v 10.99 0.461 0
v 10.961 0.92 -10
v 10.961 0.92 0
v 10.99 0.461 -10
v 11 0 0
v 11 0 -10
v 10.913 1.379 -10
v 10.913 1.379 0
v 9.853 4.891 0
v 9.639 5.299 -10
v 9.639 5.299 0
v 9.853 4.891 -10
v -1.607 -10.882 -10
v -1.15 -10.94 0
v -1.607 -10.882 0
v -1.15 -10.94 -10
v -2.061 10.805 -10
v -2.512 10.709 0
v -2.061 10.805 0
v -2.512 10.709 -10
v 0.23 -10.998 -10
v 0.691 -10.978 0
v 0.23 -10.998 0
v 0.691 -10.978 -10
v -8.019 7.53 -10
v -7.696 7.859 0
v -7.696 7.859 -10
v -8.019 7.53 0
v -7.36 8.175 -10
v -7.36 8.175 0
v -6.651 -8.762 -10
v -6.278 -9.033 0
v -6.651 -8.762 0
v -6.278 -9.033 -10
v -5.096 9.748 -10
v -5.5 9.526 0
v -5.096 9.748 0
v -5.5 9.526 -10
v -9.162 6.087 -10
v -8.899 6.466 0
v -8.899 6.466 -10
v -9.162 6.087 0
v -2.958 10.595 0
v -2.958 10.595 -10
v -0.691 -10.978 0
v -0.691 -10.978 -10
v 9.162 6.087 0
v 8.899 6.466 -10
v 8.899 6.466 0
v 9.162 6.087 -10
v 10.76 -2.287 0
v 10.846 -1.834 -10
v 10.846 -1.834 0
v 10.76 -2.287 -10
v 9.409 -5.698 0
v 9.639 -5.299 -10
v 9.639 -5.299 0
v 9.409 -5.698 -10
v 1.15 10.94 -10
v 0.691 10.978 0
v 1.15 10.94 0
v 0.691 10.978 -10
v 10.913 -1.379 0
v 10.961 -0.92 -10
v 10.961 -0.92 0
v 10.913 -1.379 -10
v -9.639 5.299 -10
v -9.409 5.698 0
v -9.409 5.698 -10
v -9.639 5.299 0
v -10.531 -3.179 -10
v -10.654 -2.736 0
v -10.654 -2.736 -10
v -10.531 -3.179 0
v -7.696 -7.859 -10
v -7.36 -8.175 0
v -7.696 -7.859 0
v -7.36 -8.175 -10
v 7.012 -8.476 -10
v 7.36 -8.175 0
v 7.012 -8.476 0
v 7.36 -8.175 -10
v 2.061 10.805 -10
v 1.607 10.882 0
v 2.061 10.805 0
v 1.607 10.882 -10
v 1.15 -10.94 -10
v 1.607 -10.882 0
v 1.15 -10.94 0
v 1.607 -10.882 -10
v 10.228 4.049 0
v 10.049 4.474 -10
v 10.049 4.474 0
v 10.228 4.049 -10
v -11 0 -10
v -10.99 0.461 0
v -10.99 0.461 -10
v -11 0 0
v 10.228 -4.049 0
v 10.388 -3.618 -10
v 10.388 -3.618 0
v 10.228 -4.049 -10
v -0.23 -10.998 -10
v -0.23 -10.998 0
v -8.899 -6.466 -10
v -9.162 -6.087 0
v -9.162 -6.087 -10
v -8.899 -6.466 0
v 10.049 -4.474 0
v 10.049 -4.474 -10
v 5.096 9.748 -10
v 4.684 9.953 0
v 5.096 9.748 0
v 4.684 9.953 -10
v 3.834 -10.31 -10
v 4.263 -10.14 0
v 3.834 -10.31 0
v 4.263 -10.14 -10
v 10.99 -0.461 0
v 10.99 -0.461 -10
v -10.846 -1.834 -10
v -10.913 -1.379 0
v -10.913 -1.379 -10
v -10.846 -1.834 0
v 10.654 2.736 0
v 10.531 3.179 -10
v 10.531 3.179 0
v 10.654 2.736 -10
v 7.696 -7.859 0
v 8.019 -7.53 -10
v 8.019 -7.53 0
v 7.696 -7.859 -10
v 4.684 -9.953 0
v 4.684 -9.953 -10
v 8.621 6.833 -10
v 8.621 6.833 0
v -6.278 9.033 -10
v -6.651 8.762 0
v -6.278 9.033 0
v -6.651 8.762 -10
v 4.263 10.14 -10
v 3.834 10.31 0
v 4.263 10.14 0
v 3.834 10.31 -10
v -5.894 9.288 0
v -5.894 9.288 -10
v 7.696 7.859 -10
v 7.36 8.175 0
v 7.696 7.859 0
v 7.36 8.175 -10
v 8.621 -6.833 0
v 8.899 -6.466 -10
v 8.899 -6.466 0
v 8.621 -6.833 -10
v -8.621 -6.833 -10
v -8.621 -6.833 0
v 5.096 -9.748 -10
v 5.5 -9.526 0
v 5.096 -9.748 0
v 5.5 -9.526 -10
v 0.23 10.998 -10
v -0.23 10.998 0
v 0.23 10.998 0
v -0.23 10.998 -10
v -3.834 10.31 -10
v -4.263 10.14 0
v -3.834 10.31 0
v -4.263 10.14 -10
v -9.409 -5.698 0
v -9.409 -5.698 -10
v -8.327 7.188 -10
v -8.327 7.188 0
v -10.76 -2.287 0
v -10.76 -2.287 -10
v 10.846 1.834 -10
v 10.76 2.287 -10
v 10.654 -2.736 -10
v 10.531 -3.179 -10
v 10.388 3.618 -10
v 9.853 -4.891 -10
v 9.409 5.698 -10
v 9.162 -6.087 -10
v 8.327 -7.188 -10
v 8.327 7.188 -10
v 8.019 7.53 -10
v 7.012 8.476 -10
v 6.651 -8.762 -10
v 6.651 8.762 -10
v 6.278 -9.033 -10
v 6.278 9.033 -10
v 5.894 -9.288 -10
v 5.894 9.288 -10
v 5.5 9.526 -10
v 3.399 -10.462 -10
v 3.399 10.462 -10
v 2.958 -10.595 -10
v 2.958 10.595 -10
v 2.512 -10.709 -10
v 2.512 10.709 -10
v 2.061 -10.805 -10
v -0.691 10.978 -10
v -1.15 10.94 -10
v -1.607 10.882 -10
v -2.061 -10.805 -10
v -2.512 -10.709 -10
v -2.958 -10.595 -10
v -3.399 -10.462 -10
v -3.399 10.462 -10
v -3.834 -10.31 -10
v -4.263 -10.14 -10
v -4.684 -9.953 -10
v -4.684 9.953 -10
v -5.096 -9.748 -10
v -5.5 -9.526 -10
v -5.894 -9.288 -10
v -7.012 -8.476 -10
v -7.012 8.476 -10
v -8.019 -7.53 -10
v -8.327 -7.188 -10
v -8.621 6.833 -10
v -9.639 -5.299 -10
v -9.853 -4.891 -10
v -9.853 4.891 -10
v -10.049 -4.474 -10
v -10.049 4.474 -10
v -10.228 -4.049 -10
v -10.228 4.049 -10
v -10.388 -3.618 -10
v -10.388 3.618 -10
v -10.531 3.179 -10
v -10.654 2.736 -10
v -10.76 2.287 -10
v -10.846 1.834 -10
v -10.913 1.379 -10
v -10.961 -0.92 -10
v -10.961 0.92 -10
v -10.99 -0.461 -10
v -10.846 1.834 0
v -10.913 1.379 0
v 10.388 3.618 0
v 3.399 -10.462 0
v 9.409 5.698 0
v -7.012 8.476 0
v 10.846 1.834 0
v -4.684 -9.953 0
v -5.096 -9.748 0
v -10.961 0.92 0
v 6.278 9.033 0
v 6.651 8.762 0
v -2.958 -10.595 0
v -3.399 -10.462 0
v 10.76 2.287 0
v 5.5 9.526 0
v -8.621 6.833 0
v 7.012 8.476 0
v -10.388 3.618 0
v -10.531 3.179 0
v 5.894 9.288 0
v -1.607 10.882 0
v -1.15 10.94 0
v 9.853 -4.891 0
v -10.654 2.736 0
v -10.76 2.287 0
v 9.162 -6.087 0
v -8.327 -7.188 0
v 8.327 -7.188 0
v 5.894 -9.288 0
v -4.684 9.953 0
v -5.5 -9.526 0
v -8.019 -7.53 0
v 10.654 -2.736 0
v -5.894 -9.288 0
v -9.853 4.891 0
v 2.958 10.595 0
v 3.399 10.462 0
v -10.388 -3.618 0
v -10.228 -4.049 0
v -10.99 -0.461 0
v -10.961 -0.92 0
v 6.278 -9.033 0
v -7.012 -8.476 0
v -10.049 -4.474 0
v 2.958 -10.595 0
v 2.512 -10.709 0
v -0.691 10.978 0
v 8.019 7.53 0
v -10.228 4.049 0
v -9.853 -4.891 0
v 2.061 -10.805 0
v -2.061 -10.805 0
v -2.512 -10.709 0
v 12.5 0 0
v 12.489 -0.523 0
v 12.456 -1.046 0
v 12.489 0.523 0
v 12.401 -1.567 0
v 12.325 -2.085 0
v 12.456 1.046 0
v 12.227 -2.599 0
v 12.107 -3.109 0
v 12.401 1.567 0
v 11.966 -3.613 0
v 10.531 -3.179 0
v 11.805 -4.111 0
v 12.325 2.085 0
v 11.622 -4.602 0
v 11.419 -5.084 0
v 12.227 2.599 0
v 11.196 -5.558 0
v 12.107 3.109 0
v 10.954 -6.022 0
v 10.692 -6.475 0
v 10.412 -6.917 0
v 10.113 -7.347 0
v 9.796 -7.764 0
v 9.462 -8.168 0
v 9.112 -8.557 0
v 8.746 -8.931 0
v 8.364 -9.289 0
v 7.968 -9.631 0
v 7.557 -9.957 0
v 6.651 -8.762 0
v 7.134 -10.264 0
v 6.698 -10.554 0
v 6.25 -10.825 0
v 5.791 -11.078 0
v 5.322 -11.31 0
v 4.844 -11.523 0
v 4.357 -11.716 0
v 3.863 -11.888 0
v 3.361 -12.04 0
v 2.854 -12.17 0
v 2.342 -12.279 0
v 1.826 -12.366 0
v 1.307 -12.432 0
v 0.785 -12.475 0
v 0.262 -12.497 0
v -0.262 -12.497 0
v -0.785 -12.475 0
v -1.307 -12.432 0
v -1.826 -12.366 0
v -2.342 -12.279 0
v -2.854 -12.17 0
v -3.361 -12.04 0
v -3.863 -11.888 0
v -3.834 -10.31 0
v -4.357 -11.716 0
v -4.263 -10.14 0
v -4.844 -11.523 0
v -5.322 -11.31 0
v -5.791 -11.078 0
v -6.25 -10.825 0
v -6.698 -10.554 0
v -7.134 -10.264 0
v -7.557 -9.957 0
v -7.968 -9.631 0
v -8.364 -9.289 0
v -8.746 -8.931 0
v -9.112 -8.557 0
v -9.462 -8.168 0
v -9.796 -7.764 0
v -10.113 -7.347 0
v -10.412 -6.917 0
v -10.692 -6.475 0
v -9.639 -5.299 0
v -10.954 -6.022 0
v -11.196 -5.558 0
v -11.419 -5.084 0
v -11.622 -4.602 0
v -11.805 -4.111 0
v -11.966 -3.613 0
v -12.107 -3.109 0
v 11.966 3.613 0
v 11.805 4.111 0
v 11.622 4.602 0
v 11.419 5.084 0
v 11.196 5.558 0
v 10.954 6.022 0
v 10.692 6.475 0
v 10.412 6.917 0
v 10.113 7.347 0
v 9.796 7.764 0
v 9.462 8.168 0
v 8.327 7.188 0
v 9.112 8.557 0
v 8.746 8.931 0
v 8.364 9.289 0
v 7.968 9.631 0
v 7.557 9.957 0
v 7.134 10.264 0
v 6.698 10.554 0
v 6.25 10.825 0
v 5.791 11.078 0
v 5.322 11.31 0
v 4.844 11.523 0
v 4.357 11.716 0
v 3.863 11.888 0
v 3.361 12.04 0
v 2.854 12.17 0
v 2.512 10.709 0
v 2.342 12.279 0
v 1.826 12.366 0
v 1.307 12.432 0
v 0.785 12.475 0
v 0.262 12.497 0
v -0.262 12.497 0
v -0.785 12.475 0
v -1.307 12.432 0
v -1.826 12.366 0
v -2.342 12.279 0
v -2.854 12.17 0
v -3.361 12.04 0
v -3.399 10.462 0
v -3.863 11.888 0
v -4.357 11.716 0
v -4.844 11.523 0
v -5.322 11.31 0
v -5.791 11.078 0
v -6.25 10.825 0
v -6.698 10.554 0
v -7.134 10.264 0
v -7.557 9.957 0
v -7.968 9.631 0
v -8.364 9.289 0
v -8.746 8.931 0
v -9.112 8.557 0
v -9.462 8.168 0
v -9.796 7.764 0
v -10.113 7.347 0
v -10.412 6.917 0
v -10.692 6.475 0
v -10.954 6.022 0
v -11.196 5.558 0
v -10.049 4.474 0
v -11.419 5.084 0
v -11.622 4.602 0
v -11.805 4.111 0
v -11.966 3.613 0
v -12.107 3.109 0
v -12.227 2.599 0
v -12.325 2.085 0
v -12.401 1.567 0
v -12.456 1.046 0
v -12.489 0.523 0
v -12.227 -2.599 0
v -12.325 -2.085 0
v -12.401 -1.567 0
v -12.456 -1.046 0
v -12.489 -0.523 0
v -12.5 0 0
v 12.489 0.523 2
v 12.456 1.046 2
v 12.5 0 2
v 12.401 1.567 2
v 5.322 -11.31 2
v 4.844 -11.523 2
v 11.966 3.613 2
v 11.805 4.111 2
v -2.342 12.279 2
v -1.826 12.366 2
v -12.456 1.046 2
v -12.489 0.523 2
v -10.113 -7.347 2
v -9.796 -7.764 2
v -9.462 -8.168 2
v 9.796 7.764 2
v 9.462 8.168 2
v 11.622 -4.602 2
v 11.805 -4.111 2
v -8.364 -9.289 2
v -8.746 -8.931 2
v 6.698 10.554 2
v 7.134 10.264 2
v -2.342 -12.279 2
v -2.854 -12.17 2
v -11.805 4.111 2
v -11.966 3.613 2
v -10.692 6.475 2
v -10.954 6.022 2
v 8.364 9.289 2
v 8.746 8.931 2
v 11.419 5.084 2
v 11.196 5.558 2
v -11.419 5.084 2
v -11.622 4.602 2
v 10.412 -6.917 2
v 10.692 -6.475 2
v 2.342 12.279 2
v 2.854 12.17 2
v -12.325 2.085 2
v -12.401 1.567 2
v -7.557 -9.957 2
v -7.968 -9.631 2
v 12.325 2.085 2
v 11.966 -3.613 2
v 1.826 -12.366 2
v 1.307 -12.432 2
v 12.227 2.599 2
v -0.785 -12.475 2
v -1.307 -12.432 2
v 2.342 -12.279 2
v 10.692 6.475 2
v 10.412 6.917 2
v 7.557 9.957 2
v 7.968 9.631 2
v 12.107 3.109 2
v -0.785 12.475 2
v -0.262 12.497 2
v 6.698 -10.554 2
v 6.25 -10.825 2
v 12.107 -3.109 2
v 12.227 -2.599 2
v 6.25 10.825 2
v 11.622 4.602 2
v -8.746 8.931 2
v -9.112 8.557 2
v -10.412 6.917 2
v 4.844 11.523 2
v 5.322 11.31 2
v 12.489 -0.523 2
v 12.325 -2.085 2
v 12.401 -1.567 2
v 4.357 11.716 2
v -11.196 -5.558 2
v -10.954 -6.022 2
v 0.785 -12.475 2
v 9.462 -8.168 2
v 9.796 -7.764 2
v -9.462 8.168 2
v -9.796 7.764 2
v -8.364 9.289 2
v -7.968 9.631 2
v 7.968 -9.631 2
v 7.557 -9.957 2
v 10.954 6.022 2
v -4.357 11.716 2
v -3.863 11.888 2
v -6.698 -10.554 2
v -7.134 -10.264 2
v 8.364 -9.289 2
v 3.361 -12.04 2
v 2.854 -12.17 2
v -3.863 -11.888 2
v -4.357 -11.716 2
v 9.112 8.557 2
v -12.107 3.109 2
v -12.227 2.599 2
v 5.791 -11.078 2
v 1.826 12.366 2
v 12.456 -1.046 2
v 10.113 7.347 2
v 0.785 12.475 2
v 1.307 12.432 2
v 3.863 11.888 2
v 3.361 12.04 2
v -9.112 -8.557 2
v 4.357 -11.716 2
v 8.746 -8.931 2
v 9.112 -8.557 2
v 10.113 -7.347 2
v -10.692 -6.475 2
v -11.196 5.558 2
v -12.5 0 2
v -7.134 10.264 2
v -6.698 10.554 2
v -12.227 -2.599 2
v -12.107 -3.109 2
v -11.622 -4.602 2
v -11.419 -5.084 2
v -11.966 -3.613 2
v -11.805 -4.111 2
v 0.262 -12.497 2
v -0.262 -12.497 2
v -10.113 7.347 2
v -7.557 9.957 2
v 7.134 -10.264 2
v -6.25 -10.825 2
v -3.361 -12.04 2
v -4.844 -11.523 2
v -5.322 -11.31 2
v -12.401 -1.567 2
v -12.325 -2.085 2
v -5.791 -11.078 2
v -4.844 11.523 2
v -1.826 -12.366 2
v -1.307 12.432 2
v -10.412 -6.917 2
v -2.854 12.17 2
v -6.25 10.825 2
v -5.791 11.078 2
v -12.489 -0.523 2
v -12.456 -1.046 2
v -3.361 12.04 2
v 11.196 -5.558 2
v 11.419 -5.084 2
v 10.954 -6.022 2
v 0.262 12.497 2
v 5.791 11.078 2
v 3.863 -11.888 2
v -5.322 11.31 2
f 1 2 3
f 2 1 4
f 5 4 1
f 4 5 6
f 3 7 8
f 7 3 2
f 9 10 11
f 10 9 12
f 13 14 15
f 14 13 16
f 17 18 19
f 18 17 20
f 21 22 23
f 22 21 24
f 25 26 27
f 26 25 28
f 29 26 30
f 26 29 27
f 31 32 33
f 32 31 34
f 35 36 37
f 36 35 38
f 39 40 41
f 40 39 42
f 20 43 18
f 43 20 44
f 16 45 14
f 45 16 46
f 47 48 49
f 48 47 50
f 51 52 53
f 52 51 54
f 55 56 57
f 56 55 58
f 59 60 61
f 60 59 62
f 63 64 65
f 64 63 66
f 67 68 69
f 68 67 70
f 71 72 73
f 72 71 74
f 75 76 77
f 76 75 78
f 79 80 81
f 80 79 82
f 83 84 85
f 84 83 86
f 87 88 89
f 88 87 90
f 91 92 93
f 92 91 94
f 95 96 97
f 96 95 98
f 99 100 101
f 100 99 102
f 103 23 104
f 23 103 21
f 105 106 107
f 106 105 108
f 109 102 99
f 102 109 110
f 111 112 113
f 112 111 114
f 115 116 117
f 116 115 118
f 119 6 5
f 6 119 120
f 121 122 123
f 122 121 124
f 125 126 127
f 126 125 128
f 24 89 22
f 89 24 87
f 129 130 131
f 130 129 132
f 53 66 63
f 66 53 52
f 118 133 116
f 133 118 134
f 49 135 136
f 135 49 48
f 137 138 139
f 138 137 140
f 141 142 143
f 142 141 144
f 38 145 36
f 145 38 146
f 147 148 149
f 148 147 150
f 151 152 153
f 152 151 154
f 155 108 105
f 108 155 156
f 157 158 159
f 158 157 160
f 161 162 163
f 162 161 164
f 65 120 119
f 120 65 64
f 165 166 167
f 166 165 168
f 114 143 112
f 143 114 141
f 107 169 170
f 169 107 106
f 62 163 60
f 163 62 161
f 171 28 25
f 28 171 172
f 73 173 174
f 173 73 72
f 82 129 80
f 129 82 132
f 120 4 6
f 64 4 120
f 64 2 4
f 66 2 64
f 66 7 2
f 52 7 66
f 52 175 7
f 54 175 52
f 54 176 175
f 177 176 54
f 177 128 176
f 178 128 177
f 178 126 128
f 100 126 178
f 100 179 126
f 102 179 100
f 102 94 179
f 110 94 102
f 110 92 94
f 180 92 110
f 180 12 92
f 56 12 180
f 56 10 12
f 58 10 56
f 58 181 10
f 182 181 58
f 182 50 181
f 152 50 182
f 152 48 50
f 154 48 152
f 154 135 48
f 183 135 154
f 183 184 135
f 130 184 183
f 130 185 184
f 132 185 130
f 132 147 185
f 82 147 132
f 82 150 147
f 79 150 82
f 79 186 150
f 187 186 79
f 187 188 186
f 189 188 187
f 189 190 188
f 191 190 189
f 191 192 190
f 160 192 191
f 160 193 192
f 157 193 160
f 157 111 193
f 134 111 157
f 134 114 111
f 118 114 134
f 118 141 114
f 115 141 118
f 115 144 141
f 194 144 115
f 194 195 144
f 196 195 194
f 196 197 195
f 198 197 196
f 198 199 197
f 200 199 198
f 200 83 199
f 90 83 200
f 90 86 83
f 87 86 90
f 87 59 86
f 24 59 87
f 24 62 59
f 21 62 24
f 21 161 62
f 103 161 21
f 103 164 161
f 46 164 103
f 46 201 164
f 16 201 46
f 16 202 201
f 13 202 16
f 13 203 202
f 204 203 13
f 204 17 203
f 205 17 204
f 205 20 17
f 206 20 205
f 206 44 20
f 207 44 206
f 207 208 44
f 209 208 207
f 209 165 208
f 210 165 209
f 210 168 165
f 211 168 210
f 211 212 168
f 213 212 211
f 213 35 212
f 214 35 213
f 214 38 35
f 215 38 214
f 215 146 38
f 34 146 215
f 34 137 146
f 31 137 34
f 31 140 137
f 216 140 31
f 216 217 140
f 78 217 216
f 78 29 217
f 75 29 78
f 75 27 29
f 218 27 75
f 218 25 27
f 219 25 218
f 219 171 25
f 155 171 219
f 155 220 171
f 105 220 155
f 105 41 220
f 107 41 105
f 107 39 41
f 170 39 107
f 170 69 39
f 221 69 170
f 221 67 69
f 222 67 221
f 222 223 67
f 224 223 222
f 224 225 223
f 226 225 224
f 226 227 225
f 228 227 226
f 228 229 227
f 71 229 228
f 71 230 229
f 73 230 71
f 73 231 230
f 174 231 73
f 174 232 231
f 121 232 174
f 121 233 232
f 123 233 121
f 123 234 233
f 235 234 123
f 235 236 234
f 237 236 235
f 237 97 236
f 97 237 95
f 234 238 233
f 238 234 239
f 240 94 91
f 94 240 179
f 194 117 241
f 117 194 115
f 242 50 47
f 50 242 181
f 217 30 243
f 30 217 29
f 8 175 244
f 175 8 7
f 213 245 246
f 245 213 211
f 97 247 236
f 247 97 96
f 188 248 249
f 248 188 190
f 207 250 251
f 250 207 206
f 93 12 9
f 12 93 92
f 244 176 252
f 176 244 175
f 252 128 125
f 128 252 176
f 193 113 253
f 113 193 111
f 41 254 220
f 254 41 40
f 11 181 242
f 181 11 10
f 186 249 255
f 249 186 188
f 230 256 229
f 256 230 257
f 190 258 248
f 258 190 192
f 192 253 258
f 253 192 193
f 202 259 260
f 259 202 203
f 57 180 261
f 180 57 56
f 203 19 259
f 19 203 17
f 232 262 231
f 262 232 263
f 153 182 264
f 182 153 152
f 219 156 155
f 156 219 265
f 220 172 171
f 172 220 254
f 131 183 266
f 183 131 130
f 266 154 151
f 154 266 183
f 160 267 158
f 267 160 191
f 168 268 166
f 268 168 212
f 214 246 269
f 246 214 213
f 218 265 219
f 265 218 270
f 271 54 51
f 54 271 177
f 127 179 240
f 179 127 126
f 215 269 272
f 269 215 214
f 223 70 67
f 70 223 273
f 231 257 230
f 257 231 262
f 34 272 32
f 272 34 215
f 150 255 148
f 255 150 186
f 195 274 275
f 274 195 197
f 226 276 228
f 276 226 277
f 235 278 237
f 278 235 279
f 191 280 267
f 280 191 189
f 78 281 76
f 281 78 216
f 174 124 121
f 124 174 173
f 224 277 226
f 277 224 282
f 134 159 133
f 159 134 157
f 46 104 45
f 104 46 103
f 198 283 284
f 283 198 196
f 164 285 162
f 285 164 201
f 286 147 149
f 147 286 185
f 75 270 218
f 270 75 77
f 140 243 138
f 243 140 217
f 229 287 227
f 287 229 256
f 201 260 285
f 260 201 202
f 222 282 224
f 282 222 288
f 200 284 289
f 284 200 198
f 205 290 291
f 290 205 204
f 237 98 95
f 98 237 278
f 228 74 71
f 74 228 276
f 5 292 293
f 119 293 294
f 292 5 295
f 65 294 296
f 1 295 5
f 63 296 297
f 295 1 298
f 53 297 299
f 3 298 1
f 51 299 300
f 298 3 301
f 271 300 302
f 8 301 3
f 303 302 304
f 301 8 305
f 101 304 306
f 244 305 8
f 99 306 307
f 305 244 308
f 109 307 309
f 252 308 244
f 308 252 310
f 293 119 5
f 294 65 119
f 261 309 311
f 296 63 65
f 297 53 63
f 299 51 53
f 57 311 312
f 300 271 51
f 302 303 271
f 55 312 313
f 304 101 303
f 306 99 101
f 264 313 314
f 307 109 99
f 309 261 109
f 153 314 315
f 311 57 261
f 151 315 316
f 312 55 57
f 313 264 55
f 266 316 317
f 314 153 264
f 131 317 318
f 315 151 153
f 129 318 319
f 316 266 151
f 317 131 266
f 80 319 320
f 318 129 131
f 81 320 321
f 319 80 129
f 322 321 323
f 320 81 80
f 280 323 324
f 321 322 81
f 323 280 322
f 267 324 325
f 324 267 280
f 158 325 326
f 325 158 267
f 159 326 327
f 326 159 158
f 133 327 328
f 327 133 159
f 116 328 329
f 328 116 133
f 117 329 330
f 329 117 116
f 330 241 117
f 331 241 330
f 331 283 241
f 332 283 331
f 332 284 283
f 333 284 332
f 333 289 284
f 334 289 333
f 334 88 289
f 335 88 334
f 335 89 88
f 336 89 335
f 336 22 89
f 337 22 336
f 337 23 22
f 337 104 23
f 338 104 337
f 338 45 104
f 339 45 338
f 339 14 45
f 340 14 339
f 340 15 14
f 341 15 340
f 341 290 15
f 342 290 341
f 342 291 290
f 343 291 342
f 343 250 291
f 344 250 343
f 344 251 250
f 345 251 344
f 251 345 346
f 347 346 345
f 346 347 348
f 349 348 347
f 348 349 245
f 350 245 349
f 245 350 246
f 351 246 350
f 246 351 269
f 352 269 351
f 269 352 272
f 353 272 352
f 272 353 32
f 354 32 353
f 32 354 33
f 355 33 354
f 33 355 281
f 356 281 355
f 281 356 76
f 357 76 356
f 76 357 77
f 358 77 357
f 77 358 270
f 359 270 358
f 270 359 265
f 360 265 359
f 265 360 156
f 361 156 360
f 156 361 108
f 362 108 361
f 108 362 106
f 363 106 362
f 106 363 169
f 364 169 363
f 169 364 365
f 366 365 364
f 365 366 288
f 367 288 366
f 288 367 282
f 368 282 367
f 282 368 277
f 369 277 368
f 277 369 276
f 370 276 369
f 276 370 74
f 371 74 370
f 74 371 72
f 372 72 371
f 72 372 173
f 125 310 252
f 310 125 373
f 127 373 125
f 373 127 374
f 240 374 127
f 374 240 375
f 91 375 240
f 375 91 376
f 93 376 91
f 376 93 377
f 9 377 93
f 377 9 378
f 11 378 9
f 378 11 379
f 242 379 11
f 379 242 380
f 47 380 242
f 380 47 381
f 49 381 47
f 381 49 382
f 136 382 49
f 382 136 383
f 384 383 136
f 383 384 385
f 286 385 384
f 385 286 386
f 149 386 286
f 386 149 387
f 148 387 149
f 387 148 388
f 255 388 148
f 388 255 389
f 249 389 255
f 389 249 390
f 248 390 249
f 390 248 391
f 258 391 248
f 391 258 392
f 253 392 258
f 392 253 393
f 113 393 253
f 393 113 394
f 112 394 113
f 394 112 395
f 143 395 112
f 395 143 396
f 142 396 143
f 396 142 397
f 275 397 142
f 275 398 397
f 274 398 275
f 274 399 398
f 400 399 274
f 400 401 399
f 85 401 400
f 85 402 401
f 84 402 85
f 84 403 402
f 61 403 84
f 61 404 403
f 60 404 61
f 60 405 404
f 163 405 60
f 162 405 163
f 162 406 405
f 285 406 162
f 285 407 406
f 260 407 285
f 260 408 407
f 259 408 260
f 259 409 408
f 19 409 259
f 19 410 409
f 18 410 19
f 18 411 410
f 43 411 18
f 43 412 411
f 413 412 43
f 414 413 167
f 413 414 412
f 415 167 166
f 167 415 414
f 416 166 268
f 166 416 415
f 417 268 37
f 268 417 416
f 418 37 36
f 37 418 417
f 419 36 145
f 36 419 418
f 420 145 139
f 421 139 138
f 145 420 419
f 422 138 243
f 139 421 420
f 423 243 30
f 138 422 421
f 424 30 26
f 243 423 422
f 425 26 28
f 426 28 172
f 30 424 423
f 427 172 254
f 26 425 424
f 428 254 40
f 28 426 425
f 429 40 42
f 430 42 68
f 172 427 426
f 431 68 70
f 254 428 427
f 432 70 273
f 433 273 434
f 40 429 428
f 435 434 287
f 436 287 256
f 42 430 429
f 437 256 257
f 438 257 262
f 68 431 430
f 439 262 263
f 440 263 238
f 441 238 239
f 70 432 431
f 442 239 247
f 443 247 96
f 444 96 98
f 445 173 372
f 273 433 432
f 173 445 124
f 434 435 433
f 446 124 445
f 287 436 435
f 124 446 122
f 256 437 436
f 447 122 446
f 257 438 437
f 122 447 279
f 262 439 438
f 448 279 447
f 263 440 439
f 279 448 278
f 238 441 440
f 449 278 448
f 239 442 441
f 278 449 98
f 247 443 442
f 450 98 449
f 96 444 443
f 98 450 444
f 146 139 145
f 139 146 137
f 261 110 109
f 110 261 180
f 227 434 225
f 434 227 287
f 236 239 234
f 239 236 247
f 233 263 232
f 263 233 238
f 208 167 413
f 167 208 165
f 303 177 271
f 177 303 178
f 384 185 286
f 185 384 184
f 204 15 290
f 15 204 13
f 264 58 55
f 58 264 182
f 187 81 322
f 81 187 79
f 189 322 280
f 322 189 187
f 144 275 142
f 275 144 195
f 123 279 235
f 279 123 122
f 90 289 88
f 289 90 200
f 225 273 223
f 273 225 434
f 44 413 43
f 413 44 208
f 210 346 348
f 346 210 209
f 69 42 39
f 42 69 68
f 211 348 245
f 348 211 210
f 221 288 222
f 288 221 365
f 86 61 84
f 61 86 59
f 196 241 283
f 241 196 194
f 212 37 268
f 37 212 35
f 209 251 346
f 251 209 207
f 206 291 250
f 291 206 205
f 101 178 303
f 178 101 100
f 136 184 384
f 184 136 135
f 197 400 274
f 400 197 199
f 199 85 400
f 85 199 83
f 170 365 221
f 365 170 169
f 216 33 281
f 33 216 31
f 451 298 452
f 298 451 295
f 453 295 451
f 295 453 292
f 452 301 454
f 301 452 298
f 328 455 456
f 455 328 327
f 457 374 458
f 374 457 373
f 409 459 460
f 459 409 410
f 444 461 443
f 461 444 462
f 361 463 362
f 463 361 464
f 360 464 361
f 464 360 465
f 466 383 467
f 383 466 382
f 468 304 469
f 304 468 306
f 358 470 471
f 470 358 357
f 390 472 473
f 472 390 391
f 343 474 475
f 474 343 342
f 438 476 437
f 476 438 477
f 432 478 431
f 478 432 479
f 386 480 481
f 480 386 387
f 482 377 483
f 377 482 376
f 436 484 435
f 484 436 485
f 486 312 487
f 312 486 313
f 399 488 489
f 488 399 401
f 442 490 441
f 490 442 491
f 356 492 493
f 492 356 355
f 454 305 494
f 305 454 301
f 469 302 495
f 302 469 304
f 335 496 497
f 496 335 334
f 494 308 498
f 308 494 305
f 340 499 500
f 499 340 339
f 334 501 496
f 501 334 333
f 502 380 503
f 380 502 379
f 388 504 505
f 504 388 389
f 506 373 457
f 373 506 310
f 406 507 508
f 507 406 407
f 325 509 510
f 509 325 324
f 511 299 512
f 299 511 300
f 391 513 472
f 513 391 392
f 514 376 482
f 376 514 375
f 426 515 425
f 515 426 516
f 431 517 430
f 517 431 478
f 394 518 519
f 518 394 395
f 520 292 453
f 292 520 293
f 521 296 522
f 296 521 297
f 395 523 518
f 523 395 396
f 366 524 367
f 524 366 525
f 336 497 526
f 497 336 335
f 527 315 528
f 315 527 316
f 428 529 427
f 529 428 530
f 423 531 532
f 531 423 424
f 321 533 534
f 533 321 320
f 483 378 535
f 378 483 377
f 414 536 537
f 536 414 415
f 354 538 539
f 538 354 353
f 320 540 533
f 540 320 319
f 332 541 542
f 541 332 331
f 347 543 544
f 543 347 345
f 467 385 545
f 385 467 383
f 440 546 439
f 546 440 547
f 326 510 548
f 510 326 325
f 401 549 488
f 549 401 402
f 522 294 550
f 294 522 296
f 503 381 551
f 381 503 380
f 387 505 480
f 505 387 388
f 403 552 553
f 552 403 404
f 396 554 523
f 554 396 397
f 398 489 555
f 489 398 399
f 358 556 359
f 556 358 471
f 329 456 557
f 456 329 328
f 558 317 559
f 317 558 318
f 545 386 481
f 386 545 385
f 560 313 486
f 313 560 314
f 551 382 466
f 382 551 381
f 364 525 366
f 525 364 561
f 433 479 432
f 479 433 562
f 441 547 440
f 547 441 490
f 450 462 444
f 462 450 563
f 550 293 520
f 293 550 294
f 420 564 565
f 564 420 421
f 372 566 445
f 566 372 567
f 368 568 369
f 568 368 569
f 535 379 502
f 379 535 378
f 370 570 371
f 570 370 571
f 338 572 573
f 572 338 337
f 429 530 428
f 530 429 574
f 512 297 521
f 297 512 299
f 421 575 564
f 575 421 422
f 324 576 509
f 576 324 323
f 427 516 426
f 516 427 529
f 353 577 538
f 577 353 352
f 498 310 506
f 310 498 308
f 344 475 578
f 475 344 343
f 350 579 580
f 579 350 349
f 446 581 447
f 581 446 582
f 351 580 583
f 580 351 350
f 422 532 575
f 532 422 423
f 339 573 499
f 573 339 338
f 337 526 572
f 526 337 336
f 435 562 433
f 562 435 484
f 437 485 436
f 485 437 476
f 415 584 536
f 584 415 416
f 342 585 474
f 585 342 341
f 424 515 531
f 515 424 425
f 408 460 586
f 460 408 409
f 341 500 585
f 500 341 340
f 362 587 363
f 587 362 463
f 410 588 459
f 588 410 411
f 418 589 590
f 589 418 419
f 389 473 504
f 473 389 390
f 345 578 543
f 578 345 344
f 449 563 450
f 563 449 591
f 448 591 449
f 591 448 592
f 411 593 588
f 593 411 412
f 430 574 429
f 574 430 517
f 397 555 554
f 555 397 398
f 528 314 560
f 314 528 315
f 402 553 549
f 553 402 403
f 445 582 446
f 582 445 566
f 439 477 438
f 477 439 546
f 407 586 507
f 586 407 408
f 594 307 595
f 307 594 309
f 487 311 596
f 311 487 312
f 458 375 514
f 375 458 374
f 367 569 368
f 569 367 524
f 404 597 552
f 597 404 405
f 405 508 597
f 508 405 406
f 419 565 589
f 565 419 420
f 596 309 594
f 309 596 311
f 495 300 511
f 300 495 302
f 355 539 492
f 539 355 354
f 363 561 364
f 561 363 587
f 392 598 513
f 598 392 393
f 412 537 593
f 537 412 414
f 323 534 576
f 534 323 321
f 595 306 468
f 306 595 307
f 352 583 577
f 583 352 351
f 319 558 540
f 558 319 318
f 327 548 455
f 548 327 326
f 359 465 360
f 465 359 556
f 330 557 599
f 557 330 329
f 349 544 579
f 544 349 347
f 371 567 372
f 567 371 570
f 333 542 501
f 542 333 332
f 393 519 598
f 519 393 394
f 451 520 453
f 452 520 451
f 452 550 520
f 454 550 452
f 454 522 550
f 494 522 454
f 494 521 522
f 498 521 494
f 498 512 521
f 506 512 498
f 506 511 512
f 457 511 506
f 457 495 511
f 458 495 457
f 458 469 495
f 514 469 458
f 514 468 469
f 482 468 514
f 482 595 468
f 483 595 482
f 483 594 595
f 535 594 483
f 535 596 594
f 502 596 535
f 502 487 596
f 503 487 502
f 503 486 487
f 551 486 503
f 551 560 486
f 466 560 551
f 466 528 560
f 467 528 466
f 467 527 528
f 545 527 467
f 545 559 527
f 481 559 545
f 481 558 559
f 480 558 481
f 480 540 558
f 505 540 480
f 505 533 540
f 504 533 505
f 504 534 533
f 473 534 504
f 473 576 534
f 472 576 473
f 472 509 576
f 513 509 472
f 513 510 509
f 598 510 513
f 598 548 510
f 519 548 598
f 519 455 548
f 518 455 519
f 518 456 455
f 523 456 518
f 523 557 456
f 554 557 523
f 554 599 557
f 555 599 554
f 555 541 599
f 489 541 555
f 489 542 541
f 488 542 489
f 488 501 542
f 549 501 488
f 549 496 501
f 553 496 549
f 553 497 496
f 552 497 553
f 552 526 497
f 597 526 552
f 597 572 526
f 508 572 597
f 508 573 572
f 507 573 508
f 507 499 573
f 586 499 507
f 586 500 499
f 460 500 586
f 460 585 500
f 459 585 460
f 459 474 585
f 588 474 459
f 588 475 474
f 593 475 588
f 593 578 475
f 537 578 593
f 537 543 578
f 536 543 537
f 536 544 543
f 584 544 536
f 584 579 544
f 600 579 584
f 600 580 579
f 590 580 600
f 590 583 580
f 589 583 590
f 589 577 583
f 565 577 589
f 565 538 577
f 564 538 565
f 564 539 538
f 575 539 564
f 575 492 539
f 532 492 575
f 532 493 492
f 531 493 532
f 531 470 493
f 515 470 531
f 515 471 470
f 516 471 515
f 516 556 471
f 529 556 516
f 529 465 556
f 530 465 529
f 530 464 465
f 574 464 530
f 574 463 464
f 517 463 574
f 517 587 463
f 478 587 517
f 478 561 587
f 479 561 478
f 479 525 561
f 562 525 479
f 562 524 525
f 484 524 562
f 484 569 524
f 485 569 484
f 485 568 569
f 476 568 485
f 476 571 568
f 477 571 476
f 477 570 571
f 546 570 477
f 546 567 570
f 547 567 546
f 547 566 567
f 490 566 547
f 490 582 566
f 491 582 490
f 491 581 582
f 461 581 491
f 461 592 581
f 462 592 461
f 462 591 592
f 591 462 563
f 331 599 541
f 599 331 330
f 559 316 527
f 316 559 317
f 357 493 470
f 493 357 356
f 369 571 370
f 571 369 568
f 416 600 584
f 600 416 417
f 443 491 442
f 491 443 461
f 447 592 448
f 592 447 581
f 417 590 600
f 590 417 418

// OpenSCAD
$fn = $preview ? 30 : 150;

// d_out = 23;  // For Tomeks printer
d_out = 22.7;  // For my printer
batt_spacer = 3;

module middle_clip() {
	difference() {
		cylinder(h=25, d=d_out, center=true);

		// blind hole
		translate([0, 0, 10 + batt_spacer / 2])
			cylinder(h=20, d=19, center=true);
		translate([0, 0, -10 - batt_spacer / 2])
			cylinder(h=20, d=19, center=true);

		// through hole
		cylinder(h=40, d=15, center=true);

		// cut in two
		translate([10, 0, 0])
			cube(size=[20, 9, 50], center=true);

		// notch for easier bending / cable routing
		for (angle=[0:45:361])
			rotate([0, 0, angle])
				translate([-8.1, 0, 0])
					cylinder(d=5, h=50, center=true);

	}
}


module end_clip() {
	difference() {
		translate([0, 0, -25 / 4])
			cylinder(h=25 / 2, d=d_out, center=true);

		// blind hole
		translate([0, 0, -10 - 1])
			cylinder(h=20, d=19, center=true);

		// cut in two
		translate([15, 0, 0])
			cube(size=[20, 9, 50], center=true);

		// notch for easier bending / cable routing
		translate([-14.8, 0, 0])
			cube(size=[10, 5, 50], center=true);

	}
}

// print with 110 % flow in an attempt to make it watertight
module end_clip_glue() {
	difference() {
		union() {
			h = 10;
			translate([0, 0, -h / 2])
				cylinder(h=h, d=22, center=true);

			// flange
			translate([0, 0, 1])
				cylinder(h=2, d=25, center=true);
		}
	}
}


module c_clip() {
	difference() {
		cylinder(h=batt_spacer, d=18, center=true);

		// through hole
		cylinder(h=40, d=15, center=true);

		// cut in two
		translate([10, 0, 0])
			cube(size=[20, 9, 50], center=true);
	}
}

module pipe() {
	difference() {
		cylinder(h=600, d=25, center=true);
		cylinder(h=601, d=23, center=true);
	}
}

module o_ring_clip(with_spout=false) {

	difference() {
		// outer diameter
		h = 11;
		union() {
			if (with_spout)
				// spout
				translate([0, 0, 5])
					cylinder(h=10, d1=7.5, d2=6, center=true);

			// flange
			translate([0, 0, 0.5])
				cylinder(h=1, d=25, center=true);

			// outer diameter
			translate([0, 0, -h / 4])
				cylinder(h=h / 2, d=20.5, center=true);
		}

		// inner diameter
		// translate([0, 0, -10 - 1])
		// 	cylinder(h=20, d=17, center=true);

		// notch for o-ring
		for (i=[-1, -4])
			translate([0, 0, i])
				rotate_extrude()
					translate([9.9, 0, 0])
						circle(d=2.1);

		if (with_spout)
			// hole for spout
			cylinder(h=50, d=3, center=true);
	}
}

module main() {
	translate([0, 0, -300])
		pipe();
	// middle_clip();
	!end_clip_glue();
	// c_clip();
	// o_ring_clip(true);
}

intersection() {
	main();
	translate([-50, 0, 0])
		cube(size=[100, 200, 100], center=true);
}
